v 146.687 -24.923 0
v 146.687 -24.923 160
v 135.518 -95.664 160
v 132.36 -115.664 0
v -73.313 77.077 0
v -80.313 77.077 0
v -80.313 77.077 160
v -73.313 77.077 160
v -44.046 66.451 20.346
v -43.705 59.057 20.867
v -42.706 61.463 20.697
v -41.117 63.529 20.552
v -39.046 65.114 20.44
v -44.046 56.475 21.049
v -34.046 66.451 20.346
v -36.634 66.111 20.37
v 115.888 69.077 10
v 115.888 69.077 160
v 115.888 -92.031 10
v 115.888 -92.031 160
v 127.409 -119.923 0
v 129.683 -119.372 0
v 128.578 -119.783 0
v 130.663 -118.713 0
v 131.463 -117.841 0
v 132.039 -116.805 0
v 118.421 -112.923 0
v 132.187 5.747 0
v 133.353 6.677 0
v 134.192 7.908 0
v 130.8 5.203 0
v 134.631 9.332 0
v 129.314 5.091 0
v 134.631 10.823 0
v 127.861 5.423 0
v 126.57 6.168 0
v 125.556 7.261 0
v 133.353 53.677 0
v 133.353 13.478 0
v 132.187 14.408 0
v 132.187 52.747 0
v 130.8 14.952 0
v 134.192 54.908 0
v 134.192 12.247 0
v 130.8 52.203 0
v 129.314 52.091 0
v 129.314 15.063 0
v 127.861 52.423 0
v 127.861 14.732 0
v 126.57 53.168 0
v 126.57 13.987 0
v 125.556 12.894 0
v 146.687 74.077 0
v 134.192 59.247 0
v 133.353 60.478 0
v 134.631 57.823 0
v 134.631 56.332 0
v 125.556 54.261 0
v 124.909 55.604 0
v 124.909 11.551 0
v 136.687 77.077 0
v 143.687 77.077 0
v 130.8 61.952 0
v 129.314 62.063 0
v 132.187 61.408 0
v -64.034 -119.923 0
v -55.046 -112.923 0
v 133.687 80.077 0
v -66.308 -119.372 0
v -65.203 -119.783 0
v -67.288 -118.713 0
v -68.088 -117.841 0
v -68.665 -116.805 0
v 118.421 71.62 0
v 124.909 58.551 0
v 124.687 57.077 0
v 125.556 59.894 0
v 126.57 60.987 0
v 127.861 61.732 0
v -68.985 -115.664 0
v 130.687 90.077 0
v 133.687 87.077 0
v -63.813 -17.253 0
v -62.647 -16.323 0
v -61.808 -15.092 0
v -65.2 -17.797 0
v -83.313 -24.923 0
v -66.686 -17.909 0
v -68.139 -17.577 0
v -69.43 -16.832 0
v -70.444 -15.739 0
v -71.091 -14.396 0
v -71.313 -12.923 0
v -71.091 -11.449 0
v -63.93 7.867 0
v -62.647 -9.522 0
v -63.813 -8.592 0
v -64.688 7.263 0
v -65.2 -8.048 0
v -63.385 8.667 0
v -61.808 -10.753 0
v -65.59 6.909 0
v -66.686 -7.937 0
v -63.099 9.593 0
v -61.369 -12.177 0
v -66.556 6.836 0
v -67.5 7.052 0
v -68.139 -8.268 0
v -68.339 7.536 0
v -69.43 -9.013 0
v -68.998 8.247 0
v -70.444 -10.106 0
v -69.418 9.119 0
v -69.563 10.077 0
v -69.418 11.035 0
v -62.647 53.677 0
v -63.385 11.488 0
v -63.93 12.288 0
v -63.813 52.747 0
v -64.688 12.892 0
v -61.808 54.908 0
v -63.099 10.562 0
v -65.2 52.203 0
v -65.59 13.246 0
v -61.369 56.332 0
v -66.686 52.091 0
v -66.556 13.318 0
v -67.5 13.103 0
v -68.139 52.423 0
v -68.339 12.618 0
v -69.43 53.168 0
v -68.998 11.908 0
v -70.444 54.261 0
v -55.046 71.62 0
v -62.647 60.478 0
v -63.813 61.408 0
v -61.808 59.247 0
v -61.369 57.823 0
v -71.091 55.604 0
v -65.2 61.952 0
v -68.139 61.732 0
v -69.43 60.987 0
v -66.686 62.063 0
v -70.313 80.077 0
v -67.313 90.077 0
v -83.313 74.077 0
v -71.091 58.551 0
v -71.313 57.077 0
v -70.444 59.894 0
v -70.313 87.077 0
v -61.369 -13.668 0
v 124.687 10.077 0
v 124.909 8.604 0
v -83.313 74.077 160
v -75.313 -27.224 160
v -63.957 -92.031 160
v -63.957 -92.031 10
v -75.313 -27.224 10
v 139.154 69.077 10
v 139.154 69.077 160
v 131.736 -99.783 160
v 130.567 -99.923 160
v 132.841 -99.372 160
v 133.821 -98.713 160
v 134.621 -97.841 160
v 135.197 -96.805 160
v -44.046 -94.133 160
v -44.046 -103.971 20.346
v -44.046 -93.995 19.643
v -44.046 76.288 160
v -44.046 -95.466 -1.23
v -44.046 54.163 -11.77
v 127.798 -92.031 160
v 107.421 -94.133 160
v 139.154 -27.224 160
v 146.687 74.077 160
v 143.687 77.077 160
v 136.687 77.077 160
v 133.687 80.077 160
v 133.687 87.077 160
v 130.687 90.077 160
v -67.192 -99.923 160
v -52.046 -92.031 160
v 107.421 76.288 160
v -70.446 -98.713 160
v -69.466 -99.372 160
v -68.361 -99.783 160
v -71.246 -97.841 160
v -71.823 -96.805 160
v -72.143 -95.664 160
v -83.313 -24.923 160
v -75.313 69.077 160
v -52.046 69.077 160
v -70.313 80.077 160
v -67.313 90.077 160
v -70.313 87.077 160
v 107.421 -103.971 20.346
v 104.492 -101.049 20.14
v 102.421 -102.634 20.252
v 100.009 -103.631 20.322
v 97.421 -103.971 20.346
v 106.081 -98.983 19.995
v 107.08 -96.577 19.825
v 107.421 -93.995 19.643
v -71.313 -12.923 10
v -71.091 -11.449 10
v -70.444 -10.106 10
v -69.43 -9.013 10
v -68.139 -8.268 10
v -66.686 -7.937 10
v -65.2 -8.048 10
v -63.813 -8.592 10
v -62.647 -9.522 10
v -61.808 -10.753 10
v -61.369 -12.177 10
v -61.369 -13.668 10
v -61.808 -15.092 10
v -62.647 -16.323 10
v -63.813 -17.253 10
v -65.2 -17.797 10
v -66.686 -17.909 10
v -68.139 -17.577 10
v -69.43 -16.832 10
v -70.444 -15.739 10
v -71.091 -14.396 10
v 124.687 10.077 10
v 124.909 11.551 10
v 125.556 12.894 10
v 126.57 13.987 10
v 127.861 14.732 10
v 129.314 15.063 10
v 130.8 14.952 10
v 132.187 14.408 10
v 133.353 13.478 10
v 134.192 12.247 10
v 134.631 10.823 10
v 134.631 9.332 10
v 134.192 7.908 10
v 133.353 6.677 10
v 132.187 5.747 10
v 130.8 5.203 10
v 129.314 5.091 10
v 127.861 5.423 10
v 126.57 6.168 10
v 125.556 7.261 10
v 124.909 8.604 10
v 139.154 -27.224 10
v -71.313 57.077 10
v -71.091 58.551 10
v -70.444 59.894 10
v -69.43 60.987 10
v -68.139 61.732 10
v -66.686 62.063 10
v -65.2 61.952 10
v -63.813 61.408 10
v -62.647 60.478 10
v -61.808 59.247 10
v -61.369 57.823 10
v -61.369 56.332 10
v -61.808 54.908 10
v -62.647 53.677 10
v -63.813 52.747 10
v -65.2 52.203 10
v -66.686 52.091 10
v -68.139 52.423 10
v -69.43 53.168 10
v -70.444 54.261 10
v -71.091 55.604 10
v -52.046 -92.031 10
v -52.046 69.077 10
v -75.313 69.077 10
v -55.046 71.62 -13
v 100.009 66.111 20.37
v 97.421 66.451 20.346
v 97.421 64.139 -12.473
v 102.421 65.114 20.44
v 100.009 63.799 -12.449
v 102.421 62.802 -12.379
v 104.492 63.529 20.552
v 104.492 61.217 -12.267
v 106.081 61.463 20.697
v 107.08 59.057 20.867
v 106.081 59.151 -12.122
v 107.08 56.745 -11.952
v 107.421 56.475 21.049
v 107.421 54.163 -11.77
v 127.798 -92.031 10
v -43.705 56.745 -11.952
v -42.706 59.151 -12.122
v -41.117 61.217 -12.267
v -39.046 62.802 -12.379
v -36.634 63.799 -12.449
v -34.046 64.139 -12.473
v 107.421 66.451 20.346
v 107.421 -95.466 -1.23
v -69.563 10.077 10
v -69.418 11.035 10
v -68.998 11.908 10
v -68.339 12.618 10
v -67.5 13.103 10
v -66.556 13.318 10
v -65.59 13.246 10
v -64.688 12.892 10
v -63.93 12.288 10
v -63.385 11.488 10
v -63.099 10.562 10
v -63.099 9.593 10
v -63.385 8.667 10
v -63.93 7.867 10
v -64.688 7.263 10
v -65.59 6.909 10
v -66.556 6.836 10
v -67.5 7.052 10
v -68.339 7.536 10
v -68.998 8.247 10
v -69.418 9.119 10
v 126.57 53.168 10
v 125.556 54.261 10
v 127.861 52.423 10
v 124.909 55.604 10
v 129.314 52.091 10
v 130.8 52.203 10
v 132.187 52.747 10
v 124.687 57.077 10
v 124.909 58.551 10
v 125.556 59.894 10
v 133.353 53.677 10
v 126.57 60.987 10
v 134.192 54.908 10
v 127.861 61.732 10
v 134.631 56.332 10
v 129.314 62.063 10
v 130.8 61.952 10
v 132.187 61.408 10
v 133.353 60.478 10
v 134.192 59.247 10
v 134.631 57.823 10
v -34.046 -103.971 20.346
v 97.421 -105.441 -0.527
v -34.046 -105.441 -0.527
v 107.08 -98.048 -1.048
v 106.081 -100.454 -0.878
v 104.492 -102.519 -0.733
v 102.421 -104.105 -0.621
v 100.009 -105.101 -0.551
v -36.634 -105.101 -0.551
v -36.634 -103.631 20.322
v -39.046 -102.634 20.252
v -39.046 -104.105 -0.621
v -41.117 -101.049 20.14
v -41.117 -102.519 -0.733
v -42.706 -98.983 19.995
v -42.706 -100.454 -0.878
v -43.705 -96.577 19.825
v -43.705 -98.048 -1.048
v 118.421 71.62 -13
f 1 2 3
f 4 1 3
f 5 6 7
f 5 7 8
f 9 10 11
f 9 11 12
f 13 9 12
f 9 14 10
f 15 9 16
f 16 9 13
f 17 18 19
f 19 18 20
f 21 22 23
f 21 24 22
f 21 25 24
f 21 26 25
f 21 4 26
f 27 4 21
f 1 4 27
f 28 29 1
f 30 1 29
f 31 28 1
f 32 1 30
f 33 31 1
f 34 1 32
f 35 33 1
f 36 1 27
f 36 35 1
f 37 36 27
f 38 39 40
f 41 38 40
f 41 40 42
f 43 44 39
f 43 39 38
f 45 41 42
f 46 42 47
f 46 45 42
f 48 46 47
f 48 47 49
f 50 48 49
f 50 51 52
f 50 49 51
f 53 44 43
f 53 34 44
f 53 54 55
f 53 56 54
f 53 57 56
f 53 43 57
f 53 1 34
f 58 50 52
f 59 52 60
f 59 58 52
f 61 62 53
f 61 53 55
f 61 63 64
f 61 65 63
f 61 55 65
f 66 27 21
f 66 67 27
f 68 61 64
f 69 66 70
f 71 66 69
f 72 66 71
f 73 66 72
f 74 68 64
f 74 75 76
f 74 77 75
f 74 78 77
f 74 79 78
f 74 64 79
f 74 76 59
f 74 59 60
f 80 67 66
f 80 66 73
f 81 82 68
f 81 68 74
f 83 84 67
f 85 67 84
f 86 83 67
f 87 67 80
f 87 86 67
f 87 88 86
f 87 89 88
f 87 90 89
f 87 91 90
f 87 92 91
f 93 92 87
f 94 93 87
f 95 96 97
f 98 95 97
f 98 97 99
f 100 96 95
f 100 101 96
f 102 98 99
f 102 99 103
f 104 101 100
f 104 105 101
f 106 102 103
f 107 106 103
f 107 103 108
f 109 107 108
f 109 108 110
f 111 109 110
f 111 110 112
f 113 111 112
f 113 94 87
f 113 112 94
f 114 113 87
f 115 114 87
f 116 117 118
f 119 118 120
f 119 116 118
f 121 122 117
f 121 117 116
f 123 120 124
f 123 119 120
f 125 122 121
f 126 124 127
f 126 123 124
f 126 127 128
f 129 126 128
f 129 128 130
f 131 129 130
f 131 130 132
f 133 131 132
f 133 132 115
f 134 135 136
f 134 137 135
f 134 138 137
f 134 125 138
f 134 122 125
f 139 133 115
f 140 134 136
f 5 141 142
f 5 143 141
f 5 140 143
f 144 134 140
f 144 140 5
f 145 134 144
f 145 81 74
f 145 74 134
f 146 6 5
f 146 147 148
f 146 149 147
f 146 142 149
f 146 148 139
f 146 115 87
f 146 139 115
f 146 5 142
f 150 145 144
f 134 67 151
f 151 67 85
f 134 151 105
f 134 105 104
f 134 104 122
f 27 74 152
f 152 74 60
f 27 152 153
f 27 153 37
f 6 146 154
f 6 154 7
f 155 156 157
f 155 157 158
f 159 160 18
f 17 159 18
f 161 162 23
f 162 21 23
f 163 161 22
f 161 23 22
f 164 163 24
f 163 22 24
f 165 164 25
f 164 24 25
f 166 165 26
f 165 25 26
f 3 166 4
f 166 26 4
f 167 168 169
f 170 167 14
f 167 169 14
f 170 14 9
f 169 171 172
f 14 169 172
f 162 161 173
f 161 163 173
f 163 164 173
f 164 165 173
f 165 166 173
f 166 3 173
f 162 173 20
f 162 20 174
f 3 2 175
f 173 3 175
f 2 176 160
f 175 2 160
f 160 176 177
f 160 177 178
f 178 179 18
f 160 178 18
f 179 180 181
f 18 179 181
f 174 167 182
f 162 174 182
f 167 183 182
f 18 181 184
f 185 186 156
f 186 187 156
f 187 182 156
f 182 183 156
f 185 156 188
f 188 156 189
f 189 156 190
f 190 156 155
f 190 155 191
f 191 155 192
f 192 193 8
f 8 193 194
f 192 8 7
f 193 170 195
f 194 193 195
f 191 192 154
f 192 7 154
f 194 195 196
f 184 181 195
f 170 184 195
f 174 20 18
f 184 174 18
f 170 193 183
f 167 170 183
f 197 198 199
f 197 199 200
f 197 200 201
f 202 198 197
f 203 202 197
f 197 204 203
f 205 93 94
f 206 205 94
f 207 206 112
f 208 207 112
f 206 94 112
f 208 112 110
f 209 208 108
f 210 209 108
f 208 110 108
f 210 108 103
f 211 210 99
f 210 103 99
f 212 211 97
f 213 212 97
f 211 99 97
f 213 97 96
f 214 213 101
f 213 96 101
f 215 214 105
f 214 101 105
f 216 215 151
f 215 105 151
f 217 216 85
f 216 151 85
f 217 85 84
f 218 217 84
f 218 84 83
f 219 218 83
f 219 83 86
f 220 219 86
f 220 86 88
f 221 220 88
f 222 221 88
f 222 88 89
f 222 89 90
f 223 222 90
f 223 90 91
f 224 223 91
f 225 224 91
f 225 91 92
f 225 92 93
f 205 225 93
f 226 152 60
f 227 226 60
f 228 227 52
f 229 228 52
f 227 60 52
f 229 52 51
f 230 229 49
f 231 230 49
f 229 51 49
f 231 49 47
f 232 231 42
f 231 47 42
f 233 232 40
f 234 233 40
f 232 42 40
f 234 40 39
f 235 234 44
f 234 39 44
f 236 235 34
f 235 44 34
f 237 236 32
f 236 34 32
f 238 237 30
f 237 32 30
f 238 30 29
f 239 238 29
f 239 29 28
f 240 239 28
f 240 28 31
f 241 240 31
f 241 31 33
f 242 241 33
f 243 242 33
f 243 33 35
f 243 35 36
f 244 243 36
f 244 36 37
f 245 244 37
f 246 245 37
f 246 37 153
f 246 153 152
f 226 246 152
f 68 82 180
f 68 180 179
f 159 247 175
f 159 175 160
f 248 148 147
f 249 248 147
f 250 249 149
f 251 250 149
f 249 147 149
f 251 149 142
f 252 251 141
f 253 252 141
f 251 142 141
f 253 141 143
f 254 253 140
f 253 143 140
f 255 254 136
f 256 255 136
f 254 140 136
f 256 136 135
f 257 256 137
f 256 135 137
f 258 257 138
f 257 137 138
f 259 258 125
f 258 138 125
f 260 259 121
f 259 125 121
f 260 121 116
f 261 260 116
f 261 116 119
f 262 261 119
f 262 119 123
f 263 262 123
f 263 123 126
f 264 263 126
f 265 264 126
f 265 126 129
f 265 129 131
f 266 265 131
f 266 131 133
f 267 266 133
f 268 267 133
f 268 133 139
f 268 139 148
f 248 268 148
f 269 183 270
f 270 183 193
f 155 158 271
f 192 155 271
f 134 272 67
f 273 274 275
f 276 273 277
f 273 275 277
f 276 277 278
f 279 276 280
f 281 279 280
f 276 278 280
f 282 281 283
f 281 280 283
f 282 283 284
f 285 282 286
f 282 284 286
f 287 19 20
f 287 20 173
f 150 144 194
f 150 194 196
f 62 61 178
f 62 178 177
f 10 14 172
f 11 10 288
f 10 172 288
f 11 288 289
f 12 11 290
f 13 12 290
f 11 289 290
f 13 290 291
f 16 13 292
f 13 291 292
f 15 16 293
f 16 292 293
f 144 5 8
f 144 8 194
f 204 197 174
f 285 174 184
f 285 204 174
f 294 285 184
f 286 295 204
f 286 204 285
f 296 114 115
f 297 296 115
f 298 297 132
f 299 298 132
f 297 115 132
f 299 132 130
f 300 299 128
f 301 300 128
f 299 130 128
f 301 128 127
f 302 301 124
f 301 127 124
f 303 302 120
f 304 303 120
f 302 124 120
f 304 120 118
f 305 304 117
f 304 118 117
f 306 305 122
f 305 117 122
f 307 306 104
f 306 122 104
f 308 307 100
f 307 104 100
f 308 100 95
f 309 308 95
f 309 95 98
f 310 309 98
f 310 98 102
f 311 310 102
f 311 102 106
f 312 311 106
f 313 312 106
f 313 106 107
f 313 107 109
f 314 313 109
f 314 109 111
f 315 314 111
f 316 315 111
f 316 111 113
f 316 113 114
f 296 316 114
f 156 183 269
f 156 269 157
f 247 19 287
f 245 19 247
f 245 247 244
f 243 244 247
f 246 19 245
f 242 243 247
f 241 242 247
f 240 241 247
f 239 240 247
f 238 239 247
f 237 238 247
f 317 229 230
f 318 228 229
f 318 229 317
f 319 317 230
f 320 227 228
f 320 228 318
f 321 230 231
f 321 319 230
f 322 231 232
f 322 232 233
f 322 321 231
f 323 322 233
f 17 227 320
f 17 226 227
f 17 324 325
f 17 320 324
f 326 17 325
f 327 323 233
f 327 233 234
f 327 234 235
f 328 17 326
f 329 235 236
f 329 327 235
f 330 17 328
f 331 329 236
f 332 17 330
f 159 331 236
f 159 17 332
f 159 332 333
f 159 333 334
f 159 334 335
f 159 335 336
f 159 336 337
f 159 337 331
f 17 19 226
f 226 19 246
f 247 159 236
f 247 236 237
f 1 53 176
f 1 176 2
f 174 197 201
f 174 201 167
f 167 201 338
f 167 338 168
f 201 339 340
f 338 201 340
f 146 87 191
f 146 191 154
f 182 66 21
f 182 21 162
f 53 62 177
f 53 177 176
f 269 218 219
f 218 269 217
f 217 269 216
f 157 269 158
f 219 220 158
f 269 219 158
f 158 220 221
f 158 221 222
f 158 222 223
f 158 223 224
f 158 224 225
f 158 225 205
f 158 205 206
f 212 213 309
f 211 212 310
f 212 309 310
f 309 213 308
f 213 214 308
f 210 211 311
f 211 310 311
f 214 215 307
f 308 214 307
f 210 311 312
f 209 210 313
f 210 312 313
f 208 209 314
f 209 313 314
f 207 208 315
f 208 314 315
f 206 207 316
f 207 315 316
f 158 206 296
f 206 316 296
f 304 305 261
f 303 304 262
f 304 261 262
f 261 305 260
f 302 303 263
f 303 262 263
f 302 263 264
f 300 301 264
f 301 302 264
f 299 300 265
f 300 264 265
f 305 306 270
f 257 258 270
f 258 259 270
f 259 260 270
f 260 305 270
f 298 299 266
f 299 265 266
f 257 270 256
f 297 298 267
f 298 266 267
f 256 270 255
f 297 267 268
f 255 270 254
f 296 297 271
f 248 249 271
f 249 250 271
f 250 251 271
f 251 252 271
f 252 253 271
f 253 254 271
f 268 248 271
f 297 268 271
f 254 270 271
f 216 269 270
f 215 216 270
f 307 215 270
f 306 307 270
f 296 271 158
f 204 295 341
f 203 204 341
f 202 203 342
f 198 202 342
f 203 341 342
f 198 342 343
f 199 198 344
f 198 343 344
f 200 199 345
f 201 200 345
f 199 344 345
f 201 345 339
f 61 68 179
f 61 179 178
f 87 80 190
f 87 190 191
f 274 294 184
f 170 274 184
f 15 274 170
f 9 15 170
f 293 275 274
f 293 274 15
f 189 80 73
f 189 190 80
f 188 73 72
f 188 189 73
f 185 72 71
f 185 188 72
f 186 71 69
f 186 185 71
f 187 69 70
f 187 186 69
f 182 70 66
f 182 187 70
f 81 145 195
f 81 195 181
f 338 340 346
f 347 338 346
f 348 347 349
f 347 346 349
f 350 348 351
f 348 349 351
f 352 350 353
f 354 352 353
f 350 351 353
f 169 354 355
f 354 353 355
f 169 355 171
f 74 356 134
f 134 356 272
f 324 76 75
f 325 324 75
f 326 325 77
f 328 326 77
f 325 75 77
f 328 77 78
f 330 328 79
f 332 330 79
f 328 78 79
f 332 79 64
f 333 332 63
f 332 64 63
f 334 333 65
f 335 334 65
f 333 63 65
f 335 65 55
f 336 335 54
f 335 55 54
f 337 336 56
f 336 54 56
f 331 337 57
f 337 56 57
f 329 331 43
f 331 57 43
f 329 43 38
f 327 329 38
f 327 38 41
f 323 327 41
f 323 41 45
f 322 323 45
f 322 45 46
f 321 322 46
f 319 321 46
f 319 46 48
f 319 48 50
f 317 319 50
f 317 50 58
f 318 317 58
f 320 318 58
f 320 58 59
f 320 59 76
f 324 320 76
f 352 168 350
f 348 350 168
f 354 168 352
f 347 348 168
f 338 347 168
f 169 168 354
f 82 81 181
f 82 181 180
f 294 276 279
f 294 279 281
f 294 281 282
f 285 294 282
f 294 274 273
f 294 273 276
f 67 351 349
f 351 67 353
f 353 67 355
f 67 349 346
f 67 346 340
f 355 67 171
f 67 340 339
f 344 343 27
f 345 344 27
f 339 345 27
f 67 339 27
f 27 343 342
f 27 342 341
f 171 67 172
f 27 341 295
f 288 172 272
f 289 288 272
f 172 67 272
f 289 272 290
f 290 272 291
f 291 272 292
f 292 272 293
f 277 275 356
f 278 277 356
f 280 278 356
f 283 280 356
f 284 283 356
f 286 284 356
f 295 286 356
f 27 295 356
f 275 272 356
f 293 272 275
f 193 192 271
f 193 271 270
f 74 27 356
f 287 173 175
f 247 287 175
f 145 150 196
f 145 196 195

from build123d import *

# Parameters (mm, degrees)
BOSS_EXTRUDE1_DEPTH     = 160
CUT_EXTRUDE1_DEPTH      = 305.764548692
CUT_EXTRUDE1_DEPTH_BACK = 305.764548692
BOSS_EXTRUDE2_DEPTH     = 20
SKETCH5_W               = 151.467001677
SKETCH5_H               = 170
CUT_EXTRUDE2_DEPTH      = 180
FILLET1_START           = -7.935101665
FILLET1_DEPTH           = 20.924834967
FILLET1_START_2         = 12.989733302
FILLET1_2_DEPTH         = 11.975549634
SKETCH6_R               = 5
SKETCH6_R_2             = 3.25
CUT_EXTRUDE3_DEPTH      = 180
CUT_EXTRUDE4_DEPTH      = 150
FILLET2_R               = 5


with BuildPart() as part:
    # Sketch1 → Boss-Extrude1 (new body)
    with BuildSketch(Plane.XY):
        Polygon((-67.312693498, 90.077399381), (130.687306502, 90.077399381), (133.687306502, 87.077399381), (133.687306502, 80.077399381), (136.687306502, 77.077399381), (143.687306502, 77.077399381), (146.687306502, 74.077399381), (146.687306502, -24.922600619), (131.687306502, -119.922600619), (-68.312693498, -119.922600619), (-83.312693498, -24.922600619), (-83.312693498, 74.077399381), (-80.312693498, 77.077399381), (-73.312693498, 77.077399381), (-70.312693498, 80.077399381), (-70.312693498, 87.077399381), align=None)
    extrude(amount=BOSS_EXTRUDE1_DEPTH)

    # Sketch4 → Cut-Extrude1 (cut, two sides: drawn at the far end of the back side and taken through both)
    with BuildSketch(Plane(origin=(146.687306502, 0, 0), x_dir=(0, 0, -1), z_dir=(1, 0, 0)).offset(-CUT_EXTRUDE1_DEPTH_BACK)):
        Polygon((533.86053197, -186.655167115), (0, -119.922600619), (-160, -99.922600619), (-693.86053197, -33.190034123), (-827.325664962, -1100.911098062), (400.395398977, -1254.376231054), align=None)
    extrude(amount=CUT_EXTRUDE1_DEPTH + CUT_EXTRUDE1_DEPTH_BACK, mode=Mode.SUBTRACT)

    # 3DSketch1 → Boss-Extrude2 (add, along a direction that is not the sketch's normal)
    with BuildSketch(Plane(origin=(-55.046194337, -112.922600619, 0), x_dir=(0.6840030395475861, 0.727675877553092, -0.05126069758597554), z_dir=(0, 0.07027027027027033, 0.9975279891392237))):
        Polygon((0, 0), (118.651956408, -126.540562316), (253.60560063, 0), (134.953644222, 126.540562316), align=None)
    extrude(amount=BOSS_EXTRUDE2_DEPTH, dir=(0, 0, 1))

    # Sketch5 → Cut-Extrude2 (cut)
    with BuildSketch(Plane(origin=(0, -0.557601739, -7.915486008), x_dir=(-1, 0, 0), z_dir=(0, -0.07027027027027048, -0.9975279891392237))):
        with Locations((-31.687306502, -20.143454724)):
            Rectangle(SKETCH5_W, SKETCH5_H)
    extrude(amount=-CUT_EXTRUDE2_DEPTH, mode=Mode.SUBTRACT)

    # Fillet1: read off the stored shape, not the designer's step
    # Fillet1 outline → Fillet1 (add)
    with BuildSketch(Plane(origin=(0, 0, 0), x_dir=(1, 0, 0), z_dir=(0, 0.07027027027027048, 0.9975279891392238)).offset(FILLET1_START)):
        with BuildLine():
            ThreePointArc((107.42080734, -95.143454724), (104.491875152, -102.214522536), (97.42080734, -105.143454724))
            Line((97.42080734, -105.143454724), (107.42080734, -105.143454724))
            Line((107.42080734, -105.143454724), (107.42080734, -95.143454724))
        make_face()
        with BuildLine():
            Line((-44.046194337, -105.143454724), (-34.046194337, -105.143454724))
            ThreePointArc((-34.046194337, -105.143454724), (-41.117262149, -102.214522536), (-44.046194337, -95.143454724))
            Line((-44.046194337, -95.143454724), (-44.046194337, -105.143454724))
        make_face()
        with BuildLine():
            ThreePointArc((97.42080734, 64.856545276), (104.491875152, 61.927613088), (107.42080734, 54.856545276))
            Line((107.42080734, 54.856545276), (107.42080734, 64.856545276))
            Line((107.42080734, 64.856545276), (97.42080734, 64.856545276))
        make_face()
        with BuildLine():
            Line((-44.046194337, 64.856545276), (-44.046194337, 54.856545276))
            ThreePointArc((-44.046194337, 54.856545276), (-41.117262149, 61.927613088), (-34.046194337, 64.856545276))
            Line((-34.046194337, 64.856545276), (-44.046194337, 64.856545276))
        make_face()
    extrude(amount=FILLET1_DEPTH)

    # Fillet1 2 outline → Fillet1 2 (add)
    with BuildSketch(Plane(origin=(0, 0, 0), x_dir=(1, 0, 0), z_dir=(0, 0.07027027027027048, 0.9975279891392238)).offset(FILLET1_START_2)):
        with BuildLine():
            ThreePointArc((97.42080734, 64.856545276), (104.491875152, 61.927613088), (107.42080734, 54.856545276))
            Line((107.42080734, 54.856545276), (107.42080734, 64.856545276))
            Line((107.42080734, 64.856545276), (97.42080734, 64.856545276))
        make_face()
        with BuildLine():
            Line((-44.046194337, 64.856545276), (-44.046194337, 54.856545276))
            ThreePointArc((-44.046194337, 54.856545276), (-41.117262149, 61.927613088), (-34.046194337, 64.856545276))
            Line((-34.046194337, 64.856545276), (-44.046194337, 64.856545276))
        make_face()
    extrude(amount=FILLET1_2_DEPTH)

    # Sketch6 → Cut-Extrude3 (cut)
    with BuildSketch(Plane(origin=(0, 0, 0), x_dir=(-1, 0, 0), z_dir=(0, 0, -1))):
        with Locations((-129.687306502, 57.077399381)):
            Circle(SKETCH6_R)
        with Locations((-129.687306502, 10.077399381)):
            Circle(SKETCH6_R)
        with Locations((66.312693498, 57.077399381)):
            Circle(SKETCH6_R)
        with Locations((66.312693498, 10.077399381)):
            Circle(SKETCH6_R_2)
        with Locations((66.312693498, -12.922600619)):
            Circle(SKETCH6_R)
    extrude(amount=-CUT_EXTRUDE3_DEPTH, mode=Mode.SUBTRACT)

    # Sketch7 → Cut-Extrude4 (cut)
    with BuildSketch(Plane.XY.offset(160)):
        Polygon((-75.312693498, 69.077399381), (-52.046194337, 69.077399381), (-52.046194337, -25.922600619), (-52.046194337, -92.030689236), (-63.956851508, -92.030689236), (-75.312693498, -27.22448539), align=None)
        Polygon((139.154308179, 69.077399381), (115.887809017, 69.077399381), (115.887809017, -25.922600619), (115.887809017, -92.030689236), (127.798466188, -92.030689236), (139.154308179, -27.22448539), align=None)
    extrude(amount=-CUT_EXTRUDE4_DEPTH, mode=Mode.SUBTRACT)

    # Fillet2
    fillet2_edges = [part.edges().sort_by_distance(p)[0] for p in [
        (-69.891640867, -109.922600619, 80),
        (133.26625387, -109.922600619, 80),
    ]]
    fillet(fillet2_edges, radius=FILLET2_R)


solid = part.part
